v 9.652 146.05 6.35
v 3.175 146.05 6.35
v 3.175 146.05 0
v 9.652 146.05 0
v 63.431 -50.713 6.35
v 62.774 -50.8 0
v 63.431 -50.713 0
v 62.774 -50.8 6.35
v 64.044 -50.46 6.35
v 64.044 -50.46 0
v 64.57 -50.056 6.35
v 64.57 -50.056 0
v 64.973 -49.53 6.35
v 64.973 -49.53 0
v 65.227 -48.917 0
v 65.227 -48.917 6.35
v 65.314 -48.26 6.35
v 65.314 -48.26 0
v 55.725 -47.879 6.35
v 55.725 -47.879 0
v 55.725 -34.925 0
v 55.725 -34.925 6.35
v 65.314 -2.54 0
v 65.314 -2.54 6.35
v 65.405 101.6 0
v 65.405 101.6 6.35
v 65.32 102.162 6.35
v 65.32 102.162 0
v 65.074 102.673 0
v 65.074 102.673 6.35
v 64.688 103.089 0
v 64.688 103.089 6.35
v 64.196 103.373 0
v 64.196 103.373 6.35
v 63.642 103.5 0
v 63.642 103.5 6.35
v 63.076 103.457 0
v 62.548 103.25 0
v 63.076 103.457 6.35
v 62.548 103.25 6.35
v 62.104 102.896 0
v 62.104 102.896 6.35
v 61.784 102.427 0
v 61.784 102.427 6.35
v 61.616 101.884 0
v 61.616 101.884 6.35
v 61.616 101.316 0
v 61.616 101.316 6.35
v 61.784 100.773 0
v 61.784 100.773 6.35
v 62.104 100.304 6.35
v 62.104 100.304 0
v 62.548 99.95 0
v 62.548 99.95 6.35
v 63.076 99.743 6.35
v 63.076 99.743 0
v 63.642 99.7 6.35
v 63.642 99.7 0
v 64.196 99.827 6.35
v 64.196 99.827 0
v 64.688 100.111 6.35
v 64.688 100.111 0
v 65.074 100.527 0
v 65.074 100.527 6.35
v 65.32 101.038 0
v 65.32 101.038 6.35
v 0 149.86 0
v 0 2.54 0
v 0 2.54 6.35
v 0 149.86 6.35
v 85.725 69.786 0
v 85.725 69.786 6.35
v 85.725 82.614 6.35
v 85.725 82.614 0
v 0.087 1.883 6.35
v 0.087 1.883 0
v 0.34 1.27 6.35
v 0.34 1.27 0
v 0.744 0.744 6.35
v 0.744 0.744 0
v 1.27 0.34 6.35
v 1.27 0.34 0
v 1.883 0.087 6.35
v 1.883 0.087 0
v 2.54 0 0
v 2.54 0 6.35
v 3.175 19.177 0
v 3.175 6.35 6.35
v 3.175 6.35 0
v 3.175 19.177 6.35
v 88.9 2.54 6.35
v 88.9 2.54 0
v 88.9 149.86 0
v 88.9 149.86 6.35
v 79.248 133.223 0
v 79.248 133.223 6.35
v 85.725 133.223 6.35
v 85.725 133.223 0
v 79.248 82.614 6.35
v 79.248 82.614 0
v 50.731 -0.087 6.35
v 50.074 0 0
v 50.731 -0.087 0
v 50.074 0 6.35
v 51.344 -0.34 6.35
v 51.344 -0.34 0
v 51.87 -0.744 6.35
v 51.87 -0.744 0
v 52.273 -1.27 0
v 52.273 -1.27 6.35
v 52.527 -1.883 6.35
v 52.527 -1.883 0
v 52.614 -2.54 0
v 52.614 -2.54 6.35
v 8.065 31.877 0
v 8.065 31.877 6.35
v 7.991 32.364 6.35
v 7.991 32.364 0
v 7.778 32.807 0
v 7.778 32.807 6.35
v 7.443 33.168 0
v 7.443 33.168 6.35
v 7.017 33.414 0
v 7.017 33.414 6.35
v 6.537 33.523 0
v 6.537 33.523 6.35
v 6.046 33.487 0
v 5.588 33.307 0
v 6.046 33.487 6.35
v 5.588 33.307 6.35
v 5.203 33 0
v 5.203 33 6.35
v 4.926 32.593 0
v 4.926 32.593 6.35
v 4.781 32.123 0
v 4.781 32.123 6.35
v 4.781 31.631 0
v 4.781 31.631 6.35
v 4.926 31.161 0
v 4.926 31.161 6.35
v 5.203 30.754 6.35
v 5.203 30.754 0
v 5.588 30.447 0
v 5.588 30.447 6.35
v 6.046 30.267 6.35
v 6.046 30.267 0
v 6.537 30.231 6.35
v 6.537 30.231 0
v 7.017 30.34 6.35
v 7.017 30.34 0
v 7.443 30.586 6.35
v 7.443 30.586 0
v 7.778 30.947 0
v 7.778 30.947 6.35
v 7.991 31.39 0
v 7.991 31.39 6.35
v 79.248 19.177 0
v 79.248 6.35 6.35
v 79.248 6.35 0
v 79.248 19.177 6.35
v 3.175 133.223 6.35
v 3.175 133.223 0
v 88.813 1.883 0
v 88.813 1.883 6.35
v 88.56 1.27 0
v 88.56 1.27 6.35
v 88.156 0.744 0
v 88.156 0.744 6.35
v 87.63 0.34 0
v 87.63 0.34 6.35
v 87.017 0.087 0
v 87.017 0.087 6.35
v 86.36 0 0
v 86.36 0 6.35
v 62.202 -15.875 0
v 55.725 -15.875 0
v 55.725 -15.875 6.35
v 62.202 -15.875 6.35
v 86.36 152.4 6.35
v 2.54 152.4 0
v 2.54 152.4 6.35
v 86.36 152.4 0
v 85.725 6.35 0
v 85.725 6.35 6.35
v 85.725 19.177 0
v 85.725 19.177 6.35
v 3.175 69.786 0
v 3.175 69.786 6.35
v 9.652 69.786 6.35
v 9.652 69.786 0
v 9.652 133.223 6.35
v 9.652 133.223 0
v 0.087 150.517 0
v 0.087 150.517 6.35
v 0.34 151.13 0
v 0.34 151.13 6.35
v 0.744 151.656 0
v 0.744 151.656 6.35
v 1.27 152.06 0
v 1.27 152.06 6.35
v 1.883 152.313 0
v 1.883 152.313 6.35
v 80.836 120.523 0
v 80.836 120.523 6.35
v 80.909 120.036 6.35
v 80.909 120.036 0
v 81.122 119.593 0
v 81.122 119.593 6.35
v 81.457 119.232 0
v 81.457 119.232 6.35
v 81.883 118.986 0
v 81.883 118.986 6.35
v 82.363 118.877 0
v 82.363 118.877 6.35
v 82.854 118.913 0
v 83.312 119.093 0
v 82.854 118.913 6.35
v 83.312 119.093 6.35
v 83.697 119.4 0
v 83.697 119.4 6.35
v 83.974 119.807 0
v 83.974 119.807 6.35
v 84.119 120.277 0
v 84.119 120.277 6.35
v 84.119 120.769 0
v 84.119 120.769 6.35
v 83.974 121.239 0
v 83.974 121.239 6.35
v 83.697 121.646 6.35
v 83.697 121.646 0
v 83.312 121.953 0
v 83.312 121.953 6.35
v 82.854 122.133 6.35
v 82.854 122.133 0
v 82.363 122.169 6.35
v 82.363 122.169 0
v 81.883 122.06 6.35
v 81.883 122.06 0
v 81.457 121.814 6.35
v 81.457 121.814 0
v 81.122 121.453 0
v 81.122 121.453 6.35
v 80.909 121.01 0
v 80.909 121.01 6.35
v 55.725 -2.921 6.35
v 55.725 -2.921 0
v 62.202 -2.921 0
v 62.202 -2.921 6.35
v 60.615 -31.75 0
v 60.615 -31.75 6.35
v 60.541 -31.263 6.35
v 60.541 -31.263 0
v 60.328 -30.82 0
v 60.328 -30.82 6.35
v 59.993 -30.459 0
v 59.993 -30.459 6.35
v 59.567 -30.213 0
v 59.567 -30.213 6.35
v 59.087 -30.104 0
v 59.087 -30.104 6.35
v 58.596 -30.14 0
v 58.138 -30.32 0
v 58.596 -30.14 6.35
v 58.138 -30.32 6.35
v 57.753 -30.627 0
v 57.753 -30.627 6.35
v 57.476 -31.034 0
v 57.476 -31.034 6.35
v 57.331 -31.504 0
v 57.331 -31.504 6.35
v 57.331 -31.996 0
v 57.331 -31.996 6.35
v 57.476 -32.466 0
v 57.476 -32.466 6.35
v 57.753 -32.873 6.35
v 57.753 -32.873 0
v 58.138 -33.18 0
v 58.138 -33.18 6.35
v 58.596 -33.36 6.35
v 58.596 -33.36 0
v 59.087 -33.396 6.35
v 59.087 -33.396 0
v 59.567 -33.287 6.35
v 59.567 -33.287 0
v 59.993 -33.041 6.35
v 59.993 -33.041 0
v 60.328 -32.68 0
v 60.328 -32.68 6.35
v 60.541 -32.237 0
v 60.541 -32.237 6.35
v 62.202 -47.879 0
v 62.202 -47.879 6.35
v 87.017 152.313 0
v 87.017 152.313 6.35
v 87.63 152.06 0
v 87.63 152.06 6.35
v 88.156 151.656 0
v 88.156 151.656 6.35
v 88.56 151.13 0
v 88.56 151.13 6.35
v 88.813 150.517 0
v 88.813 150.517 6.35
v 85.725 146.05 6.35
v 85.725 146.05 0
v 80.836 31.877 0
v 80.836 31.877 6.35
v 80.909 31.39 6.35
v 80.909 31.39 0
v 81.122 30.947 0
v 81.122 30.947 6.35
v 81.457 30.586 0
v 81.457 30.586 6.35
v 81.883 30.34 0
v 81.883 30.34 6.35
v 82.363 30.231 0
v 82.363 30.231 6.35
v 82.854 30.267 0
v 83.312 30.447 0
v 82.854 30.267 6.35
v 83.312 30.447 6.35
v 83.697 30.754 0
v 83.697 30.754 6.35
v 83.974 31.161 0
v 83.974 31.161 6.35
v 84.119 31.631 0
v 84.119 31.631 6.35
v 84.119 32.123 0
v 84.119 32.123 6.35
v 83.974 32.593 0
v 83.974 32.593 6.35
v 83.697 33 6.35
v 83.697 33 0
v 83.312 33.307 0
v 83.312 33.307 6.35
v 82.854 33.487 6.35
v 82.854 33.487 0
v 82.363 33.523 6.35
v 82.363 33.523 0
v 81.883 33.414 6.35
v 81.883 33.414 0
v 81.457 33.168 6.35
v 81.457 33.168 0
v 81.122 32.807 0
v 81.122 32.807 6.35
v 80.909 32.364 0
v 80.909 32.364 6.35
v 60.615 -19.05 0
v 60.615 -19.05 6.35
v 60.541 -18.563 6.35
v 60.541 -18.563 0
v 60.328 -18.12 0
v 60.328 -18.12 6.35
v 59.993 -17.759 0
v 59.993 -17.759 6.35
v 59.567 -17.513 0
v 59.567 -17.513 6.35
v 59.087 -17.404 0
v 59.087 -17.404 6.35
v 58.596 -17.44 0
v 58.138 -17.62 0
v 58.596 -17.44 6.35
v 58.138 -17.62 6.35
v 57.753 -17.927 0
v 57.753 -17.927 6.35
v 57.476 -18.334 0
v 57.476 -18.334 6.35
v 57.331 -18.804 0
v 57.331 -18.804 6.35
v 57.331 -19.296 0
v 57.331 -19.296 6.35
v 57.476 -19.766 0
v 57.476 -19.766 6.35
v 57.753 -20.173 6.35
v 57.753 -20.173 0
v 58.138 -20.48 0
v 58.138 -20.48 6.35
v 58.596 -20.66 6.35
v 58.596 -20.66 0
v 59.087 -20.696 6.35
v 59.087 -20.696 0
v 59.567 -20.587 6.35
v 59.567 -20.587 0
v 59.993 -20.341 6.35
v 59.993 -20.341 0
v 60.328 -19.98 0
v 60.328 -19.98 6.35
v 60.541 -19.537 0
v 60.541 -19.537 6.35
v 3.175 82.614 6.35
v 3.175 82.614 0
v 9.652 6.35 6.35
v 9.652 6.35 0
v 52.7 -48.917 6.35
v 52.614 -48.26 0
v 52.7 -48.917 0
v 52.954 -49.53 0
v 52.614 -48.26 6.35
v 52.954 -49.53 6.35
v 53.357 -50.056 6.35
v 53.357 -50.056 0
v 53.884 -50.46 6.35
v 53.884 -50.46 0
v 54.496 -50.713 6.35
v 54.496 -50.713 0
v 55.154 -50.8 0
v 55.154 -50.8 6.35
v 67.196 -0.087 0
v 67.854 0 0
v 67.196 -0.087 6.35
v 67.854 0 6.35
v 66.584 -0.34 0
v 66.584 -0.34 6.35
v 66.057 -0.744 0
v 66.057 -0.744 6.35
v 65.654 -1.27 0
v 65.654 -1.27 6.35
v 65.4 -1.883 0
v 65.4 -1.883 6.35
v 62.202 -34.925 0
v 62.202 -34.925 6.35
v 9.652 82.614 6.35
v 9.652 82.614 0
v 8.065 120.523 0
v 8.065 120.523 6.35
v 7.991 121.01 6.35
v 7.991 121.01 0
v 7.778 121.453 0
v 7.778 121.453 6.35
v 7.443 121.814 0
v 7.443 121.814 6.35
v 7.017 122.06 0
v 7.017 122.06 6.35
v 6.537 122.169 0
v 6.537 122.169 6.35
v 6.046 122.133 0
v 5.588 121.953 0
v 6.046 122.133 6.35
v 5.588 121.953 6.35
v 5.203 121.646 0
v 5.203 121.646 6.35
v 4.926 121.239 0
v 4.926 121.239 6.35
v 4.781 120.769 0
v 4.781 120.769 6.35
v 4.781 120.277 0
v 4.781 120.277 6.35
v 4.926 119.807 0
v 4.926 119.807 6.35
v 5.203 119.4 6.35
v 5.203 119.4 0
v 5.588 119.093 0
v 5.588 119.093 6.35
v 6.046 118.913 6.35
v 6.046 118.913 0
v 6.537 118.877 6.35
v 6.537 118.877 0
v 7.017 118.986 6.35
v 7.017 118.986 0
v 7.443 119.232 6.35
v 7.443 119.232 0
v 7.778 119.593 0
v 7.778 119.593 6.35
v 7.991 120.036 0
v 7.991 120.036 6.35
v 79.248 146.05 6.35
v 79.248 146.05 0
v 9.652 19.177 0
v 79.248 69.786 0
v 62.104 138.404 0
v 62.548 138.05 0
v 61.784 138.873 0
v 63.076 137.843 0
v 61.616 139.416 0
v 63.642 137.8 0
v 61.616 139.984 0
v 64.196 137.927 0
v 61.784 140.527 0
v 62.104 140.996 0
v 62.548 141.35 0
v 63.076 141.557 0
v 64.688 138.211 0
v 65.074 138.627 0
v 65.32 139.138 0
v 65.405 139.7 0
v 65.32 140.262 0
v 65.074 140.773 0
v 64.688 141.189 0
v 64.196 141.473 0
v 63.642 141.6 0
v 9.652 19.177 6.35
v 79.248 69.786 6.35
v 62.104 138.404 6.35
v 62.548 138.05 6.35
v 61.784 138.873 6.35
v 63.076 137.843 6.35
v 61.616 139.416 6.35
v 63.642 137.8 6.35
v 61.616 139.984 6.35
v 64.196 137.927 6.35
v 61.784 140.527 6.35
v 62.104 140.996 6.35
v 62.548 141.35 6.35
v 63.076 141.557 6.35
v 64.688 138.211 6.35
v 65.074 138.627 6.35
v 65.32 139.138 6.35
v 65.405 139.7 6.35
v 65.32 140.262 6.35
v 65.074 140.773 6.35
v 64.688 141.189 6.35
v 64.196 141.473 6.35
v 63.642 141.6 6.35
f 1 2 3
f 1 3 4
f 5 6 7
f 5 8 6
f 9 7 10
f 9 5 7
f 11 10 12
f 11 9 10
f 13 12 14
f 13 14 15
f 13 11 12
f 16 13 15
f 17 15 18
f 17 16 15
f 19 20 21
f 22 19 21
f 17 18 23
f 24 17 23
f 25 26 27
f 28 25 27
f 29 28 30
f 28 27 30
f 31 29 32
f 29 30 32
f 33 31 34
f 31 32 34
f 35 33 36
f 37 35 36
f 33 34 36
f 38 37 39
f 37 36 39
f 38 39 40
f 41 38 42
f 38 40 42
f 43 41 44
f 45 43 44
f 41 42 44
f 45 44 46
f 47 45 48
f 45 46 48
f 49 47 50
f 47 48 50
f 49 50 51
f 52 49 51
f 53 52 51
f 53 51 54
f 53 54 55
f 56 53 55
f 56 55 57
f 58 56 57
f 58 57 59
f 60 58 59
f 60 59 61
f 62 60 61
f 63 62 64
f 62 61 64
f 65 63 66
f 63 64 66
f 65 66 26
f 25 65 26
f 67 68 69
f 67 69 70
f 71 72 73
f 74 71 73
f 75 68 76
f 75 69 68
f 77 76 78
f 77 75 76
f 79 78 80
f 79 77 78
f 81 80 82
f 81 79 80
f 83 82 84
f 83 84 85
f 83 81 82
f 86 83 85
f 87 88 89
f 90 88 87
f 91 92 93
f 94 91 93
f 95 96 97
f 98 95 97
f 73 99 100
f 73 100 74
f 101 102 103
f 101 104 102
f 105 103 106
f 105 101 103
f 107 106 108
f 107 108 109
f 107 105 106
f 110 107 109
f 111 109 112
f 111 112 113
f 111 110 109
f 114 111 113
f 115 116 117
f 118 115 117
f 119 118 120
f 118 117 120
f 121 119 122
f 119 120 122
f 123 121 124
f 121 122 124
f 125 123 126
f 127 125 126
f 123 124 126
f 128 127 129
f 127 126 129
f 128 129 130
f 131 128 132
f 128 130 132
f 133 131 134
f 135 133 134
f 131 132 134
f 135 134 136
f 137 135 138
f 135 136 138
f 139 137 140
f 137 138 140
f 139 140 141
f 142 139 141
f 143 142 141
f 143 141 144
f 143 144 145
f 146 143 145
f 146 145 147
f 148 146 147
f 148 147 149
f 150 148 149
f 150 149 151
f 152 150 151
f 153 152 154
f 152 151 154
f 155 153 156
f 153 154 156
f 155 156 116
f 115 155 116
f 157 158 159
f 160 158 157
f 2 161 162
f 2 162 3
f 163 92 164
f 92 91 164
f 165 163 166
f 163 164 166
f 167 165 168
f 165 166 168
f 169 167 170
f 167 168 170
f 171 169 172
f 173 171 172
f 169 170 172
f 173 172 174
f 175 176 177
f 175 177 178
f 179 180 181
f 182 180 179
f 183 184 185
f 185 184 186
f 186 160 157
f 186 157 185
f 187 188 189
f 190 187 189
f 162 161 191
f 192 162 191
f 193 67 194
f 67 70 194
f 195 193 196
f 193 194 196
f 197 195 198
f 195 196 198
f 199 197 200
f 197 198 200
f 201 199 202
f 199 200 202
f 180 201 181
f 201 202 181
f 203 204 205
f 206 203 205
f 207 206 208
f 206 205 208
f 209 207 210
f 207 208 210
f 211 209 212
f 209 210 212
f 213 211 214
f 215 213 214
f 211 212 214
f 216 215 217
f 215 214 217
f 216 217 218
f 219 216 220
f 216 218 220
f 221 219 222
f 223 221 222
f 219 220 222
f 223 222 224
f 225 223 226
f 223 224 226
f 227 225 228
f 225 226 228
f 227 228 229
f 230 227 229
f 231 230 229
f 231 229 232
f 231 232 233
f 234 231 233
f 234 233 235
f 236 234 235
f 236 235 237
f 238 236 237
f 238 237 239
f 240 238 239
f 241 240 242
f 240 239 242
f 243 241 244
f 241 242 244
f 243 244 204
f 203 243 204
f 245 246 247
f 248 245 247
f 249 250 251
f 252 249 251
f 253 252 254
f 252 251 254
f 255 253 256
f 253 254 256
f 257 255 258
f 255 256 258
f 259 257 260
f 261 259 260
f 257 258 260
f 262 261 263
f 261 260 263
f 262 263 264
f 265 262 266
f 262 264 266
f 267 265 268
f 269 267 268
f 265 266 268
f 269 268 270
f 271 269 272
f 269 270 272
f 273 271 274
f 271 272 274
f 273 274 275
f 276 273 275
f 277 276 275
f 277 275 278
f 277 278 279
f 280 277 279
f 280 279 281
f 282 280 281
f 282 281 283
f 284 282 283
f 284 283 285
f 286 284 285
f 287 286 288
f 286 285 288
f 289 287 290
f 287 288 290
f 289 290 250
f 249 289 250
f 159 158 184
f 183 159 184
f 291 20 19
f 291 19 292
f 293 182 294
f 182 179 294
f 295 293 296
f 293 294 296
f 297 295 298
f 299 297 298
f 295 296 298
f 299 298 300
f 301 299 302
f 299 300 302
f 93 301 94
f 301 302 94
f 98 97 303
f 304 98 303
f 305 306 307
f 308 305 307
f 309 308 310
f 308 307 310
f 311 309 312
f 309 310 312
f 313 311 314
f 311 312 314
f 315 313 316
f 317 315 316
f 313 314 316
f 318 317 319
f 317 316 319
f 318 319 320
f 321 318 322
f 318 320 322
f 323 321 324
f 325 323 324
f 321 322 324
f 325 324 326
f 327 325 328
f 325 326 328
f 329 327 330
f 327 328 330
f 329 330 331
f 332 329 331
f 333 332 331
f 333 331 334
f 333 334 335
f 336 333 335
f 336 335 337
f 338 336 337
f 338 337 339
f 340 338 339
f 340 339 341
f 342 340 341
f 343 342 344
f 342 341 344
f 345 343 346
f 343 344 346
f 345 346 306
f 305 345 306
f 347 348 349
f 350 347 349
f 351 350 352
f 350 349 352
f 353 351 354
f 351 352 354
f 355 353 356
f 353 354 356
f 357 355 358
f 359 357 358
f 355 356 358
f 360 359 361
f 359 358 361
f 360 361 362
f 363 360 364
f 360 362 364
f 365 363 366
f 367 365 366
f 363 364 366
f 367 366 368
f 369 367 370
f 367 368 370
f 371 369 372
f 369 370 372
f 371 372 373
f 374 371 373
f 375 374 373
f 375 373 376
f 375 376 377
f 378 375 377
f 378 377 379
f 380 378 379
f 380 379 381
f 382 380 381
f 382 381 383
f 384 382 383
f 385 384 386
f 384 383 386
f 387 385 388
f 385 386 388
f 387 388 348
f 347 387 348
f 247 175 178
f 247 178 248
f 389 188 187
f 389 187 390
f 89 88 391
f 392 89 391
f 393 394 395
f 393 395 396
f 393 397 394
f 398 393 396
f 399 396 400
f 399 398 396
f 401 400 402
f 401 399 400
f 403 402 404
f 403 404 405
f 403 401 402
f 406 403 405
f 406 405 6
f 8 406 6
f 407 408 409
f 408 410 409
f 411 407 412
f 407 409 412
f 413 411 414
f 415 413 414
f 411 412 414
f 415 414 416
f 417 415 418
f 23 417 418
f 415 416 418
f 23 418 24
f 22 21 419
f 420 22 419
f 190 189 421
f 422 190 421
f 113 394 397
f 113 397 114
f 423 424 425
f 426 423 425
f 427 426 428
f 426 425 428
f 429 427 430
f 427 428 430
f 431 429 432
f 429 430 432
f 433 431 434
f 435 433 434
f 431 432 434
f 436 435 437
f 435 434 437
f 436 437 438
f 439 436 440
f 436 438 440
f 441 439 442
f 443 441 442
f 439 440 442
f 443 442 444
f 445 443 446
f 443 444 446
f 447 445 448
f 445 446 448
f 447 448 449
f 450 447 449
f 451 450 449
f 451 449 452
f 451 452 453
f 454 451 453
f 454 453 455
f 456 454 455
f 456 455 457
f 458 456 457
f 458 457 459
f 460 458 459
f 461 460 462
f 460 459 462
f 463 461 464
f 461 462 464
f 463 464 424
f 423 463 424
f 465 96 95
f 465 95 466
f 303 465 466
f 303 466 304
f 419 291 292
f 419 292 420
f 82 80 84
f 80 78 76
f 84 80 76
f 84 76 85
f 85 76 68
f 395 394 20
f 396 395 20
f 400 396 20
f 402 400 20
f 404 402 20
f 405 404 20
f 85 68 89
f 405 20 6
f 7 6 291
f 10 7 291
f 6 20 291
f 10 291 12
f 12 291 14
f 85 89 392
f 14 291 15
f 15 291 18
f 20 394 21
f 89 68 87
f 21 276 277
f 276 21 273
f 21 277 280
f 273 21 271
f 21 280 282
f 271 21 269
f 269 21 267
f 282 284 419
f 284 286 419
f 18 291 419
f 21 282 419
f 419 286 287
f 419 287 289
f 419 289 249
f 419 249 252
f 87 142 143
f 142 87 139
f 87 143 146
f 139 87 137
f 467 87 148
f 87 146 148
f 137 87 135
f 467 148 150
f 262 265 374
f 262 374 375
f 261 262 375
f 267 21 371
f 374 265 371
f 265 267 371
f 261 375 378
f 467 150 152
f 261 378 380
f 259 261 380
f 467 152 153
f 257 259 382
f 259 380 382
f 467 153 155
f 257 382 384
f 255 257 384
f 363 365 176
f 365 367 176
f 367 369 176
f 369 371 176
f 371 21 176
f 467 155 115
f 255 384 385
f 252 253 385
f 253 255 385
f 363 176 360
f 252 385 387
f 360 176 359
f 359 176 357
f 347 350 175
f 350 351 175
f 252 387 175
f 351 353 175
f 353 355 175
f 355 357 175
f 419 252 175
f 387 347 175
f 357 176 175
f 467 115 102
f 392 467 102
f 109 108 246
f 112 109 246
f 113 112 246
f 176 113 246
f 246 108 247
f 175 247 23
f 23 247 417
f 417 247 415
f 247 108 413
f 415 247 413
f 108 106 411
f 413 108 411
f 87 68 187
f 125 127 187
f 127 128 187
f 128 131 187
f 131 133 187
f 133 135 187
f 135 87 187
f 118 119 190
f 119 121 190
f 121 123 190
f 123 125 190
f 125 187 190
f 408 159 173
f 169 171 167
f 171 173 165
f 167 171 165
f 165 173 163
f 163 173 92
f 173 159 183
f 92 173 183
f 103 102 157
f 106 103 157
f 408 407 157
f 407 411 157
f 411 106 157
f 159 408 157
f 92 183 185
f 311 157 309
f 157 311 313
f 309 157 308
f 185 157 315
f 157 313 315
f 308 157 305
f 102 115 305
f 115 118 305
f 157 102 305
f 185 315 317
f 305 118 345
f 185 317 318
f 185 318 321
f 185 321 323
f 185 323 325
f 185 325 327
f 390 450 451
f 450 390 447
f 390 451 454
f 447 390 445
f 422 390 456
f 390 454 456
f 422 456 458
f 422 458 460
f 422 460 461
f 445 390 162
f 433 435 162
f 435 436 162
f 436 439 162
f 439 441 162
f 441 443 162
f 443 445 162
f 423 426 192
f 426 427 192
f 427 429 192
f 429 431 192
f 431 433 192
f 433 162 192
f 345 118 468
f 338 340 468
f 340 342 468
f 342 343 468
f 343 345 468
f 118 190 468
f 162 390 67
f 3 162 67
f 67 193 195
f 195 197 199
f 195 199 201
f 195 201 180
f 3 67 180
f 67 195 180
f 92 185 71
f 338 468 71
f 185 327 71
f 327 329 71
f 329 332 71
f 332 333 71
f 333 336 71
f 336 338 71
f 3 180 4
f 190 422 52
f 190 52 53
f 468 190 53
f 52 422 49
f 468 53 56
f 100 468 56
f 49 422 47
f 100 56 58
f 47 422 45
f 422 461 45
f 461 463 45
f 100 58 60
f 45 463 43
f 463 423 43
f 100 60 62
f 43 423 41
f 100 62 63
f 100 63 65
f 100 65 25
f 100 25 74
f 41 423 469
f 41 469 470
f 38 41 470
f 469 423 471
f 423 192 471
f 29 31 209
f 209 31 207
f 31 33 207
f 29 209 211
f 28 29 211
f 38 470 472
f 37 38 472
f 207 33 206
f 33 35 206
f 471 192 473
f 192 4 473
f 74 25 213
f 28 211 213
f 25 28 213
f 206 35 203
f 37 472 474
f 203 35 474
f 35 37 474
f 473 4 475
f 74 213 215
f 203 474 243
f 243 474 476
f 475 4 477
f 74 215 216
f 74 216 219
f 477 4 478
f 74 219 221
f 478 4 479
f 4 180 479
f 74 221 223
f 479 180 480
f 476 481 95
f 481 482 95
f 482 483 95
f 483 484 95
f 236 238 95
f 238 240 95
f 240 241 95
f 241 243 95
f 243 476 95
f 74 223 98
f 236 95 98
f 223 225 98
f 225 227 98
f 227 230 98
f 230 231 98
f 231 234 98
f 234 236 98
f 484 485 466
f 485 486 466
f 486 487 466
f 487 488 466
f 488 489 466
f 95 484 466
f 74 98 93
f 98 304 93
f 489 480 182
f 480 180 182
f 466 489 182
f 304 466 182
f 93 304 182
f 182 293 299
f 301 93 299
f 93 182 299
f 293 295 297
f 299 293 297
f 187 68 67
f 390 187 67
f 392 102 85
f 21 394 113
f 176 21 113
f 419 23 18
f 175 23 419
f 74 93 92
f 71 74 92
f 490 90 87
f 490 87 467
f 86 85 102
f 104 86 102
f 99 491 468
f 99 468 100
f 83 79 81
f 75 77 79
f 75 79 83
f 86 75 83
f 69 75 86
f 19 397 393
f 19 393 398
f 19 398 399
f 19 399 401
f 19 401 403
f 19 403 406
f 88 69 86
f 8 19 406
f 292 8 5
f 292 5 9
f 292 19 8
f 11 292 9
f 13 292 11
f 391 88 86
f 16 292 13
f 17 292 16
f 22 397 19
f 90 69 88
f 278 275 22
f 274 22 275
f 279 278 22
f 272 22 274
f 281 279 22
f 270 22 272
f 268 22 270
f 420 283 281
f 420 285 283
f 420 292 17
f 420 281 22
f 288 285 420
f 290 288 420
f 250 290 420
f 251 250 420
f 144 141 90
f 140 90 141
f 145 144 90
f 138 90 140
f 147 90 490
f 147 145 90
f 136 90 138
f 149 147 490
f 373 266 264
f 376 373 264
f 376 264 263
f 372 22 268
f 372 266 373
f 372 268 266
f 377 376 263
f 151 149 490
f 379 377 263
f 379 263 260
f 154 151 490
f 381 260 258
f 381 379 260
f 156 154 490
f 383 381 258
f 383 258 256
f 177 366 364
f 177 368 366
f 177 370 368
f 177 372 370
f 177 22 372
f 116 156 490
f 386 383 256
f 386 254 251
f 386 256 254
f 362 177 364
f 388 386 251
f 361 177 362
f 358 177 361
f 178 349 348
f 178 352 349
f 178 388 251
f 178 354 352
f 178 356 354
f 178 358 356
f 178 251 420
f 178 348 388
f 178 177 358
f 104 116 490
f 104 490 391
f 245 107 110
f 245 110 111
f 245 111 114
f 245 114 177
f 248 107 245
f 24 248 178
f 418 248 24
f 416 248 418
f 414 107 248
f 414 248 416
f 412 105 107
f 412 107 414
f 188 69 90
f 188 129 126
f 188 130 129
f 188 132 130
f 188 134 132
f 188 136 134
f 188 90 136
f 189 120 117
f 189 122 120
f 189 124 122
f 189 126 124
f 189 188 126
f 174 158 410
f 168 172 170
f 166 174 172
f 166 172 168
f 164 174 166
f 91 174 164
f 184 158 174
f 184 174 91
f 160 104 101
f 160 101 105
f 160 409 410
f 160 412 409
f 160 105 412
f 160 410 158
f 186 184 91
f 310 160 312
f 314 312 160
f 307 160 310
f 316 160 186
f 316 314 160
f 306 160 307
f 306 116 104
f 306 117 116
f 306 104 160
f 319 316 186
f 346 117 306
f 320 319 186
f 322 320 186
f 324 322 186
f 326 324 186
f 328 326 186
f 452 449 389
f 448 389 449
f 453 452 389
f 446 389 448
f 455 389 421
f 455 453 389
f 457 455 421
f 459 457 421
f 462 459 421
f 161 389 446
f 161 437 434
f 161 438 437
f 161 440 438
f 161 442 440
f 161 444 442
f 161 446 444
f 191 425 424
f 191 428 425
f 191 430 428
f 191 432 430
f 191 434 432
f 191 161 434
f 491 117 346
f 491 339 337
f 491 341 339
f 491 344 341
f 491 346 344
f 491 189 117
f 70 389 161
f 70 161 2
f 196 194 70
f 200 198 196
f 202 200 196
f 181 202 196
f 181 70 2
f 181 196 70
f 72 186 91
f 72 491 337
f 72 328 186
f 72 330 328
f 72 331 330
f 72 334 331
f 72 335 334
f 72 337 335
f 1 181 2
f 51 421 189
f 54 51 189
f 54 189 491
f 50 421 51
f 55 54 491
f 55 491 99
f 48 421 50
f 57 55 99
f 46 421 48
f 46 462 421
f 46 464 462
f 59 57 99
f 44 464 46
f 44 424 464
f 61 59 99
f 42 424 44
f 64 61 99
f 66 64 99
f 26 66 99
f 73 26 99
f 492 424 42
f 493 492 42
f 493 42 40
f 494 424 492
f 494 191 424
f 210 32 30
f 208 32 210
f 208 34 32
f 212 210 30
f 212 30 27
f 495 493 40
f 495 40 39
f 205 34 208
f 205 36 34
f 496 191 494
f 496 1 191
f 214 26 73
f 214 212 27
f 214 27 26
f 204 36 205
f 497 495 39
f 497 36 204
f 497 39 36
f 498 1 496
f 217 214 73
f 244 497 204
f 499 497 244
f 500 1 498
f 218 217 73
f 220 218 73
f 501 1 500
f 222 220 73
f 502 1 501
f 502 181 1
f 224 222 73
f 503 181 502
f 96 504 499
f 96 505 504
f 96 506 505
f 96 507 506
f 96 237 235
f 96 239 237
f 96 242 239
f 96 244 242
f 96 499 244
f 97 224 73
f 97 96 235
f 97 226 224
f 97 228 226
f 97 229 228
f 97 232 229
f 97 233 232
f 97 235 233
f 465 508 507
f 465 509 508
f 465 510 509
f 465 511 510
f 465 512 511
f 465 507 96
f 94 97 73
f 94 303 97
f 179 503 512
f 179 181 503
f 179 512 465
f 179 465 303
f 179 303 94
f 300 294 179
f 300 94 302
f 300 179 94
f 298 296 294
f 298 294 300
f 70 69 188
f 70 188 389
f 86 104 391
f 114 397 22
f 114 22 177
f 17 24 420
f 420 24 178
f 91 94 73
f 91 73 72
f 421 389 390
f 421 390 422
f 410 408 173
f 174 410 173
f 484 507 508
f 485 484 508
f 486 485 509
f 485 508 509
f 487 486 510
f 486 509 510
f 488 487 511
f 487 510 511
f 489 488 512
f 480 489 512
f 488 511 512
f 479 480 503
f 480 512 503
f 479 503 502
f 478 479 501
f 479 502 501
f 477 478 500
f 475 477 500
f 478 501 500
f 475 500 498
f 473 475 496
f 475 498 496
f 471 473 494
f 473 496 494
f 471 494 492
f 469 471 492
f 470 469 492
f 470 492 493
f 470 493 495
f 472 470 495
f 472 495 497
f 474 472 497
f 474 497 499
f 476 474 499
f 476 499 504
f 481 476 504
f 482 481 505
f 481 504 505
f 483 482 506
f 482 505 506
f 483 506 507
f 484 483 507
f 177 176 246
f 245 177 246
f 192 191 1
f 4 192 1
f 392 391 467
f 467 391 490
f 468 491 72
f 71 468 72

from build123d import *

# Parameters (mm, degrees)
SKETCH1_W           = 88.9
SKETCH1_H           = 152.4
SKETCH1_W_2         = 12.7
SKETCH1_H_2         = 50.8
SKETCH1_W_3         = 6.477
SKETCH1_H_3         = 12.954
BOSS_EXTRUDE1_DEPTH = 6.35
SKETCH3_W           = 6.477
SKETCH3_H           = 12.827
SKETCH3_R           = 1.651
CUT_EXTRUDE3_DEPTH  = 6.35
SKETCH4_R           = 1.651
CUT_EXTRUDE4_DEPTH  = 6.35
FILLET1_R           = 2.54
SKETCH5_R           = 1.905
CUT_EXTRUDE5_DEPTH  = 6.35


with BuildPart() as part:
    # Sketch1 → Boss-Extrude1 (new body)
    # profile 1 of 2: a face of its own
    with BuildSketch(Plane.XY):
        with Locations((44.45, 76.2)):
            Rectangle(SKETCH1_W, SKETCH1_H)
    # profile 2 of 2: a face of its own
    with BuildSketch(Plane.XY):
        with Locations((58.963500056, -25.4)):
            Rectangle(SKETCH1_W_2, SKETCH1_H_2)
        with Locations((58.963500056, -41.402)):
            Rectangle(SKETCH1_W_3, SKETCH1_H_3, mode=Mode.SUBTRACT)
        with Locations((58.963500056, -9.398)):
            Rectangle(SKETCH1_W_3, SKETCH1_H_3, mode=Mode.SUBTRACT)
    extrude(amount=BOSS_EXTRUDE1_DEPTH)

    # Sketch3 → Cut-Extrude3 (cut)
    with BuildSketch(Plane.XY.offset(6.35)):
        with Locations((6.4135, 139.6365)):
            Rectangle(SKETCH3_W, SKETCH3_H)
        with Locations((6.4135, 12.7635)):
            Rectangle(SKETCH3_W, SKETCH3_H)
        with Locations((82.4865, 139.6365)):
            Rectangle(SKETCH3_W, SKETCH3_H)
        with Locations((6.4135, 120.523)):
            Circle(SKETCH3_R)
        with Locations((6.4135, 76.2)):
            Rectangle(SKETCH3_W, SKETCH3_H)
        with Locations((6.4135, 31.877)):
            Circle(SKETCH3_R)
        with Locations((82.4865, 12.7635)):
            Rectangle(SKETCH3_W, SKETCH3_H)
        with Locations(Location((82.4865, 31.877, 0), (0, 0, 180))):
            Circle(SKETCH3_R)
        with Locations(Location((82.4865, 120.523, 0), (0, 0, 180))):
            Circle(SKETCH3_R)
        with Locations((82.4865, 76.2)):
            Rectangle(SKETCH3_W, SKETCH3_H)
    extrude(amount=-CUT_EXTRUDE3_DEPTH, mode=Mode.SUBTRACT)

    # Sketch4 → Cut-Extrude4 (cut)
    with BuildSketch(Plane.XY.offset(6.35)):
        with Locations((58.963500056, -19.05)):
            Circle(SKETCH4_R)
        with Locations((58.963500056, -31.75)):
            Circle(SKETCH4_R)
    extrude(amount=-CUT_EXTRUDE4_DEPTH, mode=Mode.SUBTRACT)

    # Fillet1
    fillet1_edges = [part.edges().sort_by_distance(p)[0] for p in [
        (0, 0, 3.175),
        (0, 152.4, 3.175),
        (88.9, 152.4, 3.175),
        (88.9, 0, 3.175),
        (65.313500056, 0, 3.175),
        (65.313500056, -50.8, 3.175),
        (52.613500056, -50.8, 3.175),
        (52.613500056, 0, 3.175),
    ]]
    fillet(fillet1_edges, radius=FILLET1_R)

    # Sketch5 → Cut-Extrude5 (cut)
    with BuildSketch(Plane.XY.offset(6.35)):
        with Locations((63.5, 139.7)):
            Circle(SKETCH5_R)
        with Locations((63.5, 101.6)):
            Circle(SKETCH5_R)
    extrude(amount=-CUT_EXTRUDE5_DEPTH, mode=Mode.SUBTRACT)


solid = part.part
